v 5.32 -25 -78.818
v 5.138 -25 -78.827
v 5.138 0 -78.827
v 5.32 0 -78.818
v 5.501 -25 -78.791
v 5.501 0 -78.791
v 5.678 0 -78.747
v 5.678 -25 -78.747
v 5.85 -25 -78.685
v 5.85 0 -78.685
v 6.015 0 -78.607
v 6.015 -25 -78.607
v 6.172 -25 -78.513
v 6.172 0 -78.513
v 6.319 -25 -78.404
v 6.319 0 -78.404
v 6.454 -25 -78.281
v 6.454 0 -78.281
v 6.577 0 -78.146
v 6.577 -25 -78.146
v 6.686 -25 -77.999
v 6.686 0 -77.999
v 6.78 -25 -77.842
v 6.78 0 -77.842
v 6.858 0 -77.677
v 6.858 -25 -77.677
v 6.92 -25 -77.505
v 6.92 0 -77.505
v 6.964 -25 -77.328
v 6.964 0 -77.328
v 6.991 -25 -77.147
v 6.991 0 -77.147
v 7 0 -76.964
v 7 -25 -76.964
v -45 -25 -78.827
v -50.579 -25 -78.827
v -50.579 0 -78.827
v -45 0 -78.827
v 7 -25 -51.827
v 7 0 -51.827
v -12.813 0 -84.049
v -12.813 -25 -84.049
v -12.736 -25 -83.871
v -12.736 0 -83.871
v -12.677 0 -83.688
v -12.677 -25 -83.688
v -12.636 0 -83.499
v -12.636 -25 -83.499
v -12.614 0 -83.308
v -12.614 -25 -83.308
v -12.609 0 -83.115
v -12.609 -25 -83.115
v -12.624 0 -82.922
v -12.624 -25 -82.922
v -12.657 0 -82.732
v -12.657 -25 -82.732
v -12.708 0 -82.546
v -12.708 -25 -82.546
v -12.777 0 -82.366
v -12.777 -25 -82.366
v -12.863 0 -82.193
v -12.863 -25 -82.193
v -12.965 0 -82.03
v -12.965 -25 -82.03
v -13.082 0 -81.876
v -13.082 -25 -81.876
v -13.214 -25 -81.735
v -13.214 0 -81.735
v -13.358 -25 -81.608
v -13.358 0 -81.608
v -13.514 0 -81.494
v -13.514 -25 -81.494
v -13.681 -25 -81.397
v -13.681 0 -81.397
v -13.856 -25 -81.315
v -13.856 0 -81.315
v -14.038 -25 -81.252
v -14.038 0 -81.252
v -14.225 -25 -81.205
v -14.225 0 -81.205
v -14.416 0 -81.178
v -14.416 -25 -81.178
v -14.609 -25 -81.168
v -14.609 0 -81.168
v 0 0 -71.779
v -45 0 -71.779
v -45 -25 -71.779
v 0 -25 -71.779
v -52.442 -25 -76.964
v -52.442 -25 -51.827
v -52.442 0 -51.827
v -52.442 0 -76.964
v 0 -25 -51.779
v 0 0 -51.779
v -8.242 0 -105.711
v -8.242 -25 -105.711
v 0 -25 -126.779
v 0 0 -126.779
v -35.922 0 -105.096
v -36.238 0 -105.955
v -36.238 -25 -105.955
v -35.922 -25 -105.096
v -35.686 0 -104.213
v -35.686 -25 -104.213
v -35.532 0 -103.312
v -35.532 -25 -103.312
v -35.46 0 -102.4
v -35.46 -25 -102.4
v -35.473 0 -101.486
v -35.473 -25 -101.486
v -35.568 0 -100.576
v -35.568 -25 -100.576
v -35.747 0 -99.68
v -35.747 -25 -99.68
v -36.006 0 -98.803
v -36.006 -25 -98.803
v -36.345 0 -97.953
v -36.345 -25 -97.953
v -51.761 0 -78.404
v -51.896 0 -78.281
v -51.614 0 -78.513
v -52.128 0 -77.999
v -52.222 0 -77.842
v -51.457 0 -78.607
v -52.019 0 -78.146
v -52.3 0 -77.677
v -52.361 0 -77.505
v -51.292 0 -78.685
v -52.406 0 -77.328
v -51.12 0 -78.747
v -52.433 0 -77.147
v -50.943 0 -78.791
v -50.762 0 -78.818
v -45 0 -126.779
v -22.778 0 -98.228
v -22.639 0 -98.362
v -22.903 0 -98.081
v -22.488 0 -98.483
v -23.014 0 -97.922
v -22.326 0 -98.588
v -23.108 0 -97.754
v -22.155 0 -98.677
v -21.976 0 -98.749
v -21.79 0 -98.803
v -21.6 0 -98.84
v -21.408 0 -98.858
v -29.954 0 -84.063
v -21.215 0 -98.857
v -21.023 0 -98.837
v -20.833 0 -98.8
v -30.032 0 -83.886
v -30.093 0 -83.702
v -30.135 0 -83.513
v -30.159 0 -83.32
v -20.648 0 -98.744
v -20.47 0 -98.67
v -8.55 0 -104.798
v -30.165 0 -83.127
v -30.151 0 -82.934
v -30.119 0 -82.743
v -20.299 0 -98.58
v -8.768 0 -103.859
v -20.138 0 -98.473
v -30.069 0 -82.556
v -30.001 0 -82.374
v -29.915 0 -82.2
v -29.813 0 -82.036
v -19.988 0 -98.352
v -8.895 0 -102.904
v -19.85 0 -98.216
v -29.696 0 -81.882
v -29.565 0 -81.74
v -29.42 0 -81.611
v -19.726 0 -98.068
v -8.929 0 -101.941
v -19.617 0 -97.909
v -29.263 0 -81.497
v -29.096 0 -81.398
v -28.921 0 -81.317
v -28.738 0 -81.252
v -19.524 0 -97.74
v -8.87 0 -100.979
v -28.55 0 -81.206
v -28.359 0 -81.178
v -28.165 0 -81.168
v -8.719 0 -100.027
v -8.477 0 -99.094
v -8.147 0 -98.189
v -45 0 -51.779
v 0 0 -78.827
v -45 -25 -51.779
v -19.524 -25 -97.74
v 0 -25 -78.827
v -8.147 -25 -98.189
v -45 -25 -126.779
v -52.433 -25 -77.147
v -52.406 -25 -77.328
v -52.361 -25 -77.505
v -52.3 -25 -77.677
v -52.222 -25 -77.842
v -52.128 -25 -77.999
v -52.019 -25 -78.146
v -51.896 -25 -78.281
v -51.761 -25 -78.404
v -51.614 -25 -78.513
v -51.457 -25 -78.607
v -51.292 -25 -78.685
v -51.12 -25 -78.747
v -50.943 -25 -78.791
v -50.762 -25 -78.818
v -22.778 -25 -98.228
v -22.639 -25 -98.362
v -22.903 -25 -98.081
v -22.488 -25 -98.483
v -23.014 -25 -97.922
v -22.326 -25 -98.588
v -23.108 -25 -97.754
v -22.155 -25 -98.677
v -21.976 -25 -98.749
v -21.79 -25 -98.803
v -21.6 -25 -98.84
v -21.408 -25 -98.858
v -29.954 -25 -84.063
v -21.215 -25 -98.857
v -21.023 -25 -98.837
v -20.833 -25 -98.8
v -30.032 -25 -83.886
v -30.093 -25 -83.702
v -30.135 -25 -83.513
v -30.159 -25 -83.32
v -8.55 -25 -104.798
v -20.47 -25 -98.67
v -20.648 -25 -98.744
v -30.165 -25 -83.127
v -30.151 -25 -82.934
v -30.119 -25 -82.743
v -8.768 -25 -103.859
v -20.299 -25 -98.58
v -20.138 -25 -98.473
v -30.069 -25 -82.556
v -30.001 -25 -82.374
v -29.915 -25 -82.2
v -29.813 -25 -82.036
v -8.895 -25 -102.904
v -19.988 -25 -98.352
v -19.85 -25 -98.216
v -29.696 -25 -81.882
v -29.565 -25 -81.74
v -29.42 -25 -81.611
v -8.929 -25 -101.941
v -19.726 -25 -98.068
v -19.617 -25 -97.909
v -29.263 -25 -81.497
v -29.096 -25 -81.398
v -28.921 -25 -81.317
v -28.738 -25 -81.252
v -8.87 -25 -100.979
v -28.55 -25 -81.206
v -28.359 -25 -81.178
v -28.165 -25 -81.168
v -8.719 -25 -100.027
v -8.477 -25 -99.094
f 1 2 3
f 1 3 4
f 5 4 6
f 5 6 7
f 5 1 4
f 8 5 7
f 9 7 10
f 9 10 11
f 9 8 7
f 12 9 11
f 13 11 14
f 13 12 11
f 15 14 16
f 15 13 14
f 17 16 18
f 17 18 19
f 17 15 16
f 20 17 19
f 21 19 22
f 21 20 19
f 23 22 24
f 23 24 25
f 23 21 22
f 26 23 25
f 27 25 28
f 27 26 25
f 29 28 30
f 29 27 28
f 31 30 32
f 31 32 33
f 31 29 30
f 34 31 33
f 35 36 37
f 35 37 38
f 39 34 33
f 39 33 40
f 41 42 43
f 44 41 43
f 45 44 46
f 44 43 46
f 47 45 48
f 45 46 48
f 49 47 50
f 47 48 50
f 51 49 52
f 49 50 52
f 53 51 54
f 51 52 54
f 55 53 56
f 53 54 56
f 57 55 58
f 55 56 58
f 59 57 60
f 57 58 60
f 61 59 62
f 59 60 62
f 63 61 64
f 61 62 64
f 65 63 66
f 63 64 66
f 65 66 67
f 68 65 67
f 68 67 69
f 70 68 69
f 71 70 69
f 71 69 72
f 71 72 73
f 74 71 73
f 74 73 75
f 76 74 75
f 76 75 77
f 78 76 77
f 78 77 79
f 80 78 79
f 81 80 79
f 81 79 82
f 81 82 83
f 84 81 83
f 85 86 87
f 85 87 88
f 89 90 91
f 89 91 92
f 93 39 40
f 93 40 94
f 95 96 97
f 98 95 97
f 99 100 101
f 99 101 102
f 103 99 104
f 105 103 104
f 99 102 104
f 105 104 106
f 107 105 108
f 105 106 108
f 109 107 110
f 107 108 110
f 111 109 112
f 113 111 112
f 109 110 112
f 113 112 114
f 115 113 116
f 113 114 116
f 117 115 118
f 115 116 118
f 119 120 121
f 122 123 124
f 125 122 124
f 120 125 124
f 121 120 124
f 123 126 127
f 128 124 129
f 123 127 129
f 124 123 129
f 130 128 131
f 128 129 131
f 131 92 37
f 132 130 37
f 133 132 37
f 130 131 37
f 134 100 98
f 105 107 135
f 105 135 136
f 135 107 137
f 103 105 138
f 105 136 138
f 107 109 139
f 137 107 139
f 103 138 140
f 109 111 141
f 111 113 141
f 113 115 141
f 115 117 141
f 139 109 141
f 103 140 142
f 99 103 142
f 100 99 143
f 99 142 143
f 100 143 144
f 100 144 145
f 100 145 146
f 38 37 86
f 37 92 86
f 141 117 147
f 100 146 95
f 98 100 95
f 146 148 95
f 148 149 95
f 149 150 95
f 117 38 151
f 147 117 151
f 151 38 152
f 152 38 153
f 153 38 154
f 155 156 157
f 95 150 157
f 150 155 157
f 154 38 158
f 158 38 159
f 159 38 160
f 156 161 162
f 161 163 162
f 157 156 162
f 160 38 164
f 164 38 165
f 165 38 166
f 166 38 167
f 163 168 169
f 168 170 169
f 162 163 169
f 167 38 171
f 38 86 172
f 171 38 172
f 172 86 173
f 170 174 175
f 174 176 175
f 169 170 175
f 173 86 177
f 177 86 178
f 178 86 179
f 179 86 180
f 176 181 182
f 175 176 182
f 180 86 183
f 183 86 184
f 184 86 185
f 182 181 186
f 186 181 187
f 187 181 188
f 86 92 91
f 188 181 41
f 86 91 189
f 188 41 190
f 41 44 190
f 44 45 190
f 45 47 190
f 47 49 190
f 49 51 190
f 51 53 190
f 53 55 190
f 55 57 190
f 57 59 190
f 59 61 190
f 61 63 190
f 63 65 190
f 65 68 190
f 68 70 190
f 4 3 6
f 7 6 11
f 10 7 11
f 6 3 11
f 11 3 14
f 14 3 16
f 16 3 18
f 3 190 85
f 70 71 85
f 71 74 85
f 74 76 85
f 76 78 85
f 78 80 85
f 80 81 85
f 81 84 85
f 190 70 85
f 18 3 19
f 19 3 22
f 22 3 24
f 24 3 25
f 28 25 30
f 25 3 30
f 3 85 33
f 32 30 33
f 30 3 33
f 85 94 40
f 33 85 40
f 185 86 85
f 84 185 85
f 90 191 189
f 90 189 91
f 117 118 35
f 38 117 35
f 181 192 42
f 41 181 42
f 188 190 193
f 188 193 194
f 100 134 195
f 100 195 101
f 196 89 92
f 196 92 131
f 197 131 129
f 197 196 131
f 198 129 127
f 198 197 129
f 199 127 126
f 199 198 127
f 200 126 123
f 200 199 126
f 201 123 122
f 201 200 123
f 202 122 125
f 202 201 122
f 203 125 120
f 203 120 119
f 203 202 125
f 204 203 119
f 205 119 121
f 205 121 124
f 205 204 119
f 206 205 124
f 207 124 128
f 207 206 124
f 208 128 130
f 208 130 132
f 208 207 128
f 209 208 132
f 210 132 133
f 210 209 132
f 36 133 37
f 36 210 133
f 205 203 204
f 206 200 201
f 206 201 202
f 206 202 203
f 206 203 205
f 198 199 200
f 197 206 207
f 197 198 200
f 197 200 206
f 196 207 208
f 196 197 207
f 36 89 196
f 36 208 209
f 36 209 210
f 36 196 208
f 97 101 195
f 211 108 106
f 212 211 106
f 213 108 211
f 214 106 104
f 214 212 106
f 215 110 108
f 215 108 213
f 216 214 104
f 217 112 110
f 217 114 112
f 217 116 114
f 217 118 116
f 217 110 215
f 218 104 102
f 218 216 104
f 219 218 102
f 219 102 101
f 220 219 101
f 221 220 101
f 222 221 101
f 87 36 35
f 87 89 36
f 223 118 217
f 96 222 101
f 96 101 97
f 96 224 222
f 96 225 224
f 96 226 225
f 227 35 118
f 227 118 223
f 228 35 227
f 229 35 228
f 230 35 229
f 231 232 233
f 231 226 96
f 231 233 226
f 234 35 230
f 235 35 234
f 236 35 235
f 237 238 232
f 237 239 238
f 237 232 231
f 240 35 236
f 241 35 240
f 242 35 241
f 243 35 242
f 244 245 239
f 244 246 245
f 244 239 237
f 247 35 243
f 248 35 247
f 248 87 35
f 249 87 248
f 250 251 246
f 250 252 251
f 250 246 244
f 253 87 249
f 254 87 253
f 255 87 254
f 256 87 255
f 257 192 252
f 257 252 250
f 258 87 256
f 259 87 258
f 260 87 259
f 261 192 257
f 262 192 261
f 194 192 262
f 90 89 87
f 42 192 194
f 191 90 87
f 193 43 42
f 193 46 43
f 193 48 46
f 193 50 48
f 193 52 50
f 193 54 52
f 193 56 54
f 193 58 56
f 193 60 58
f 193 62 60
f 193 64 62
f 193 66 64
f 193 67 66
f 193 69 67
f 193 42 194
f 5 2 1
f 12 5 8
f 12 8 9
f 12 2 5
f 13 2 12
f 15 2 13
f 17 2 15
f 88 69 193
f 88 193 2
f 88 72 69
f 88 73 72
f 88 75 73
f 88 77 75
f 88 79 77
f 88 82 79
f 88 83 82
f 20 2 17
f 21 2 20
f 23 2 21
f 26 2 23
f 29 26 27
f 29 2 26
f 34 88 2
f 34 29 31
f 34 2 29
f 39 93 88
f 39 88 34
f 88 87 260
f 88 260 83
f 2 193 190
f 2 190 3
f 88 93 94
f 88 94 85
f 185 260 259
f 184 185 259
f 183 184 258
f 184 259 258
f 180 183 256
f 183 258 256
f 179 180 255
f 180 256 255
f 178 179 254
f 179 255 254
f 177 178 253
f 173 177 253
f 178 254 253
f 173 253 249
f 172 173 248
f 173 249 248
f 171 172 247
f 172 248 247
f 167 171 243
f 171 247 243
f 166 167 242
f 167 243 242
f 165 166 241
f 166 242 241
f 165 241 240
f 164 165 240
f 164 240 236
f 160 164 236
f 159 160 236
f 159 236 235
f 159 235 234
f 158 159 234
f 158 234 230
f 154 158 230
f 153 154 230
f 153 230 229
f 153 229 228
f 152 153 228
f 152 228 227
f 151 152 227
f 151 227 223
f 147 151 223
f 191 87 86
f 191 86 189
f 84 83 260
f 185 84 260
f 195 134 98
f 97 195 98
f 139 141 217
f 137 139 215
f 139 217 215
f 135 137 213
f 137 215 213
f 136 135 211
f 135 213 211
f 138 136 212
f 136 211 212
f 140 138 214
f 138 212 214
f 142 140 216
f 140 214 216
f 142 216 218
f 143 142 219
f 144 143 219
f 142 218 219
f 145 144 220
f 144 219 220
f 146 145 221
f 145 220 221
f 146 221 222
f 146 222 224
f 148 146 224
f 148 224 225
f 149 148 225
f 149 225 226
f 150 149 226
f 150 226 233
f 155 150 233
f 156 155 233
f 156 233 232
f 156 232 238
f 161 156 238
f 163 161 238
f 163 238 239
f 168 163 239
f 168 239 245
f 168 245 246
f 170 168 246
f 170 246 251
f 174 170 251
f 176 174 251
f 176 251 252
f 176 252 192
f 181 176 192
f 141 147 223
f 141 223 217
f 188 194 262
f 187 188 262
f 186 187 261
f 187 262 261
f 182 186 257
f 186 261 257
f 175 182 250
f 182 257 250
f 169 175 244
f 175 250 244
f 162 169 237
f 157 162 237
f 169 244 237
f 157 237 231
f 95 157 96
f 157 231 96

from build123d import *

# Parameters (mm, degrees)
F0_W     = 45
F0_H     = 55
F1_DEPTH = 25
F3_DEPTH = 25
F5_DEPTH = 25
F7_DEPTH = 42.3


with BuildPart() as f1:
    # F0 (on Front) → F1 (new body)
    with BuildSketch(Plane.XZ):
        with Locations((-22.5, -99.278839)):
            Rectangle(F0_W, F0_H)
    extrude(amount=F1_DEPTH)

    # F2 (on face) → F3 (join)
    with BuildSketch(Plane.XZ.offset(25)):
        with BuildLine():
            Line((0, -51.778839), (0, -71.778839))
            Line((0, -71.778839), (0, -78.826934))
            Line((0, -78.826934), (5.137502, -78.826934))
            ThreePointArc((5.137502, -78.826934), (6.454487, -78.281421), (7, -76.964436))
            Line((7, -76.964436), (7, -51.826934))
            Line((7, -51.826934), (0, -51.778839))
        make_face()
        with BuildLine():
            Line((-45, -78.826934), (-45, -71.778839))
            Line((-45, -71.778839), (-45, -51.778839))
            Line((-45, -51.778839), (-52.44166, -51.826934))
            Line((-52.44166, -51.826934), (-52.44166, -76.964436))
            ThreePointArc((-52.44166, -76.964436), (-51.896147, -78.281421), (-50.579162, -78.826934))
            Line((-50.579162, -78.826934), (-45, -78.826934))
        make_face()
    extrude(amount=-F3_DEPTH)

    # F4 (on face) → F5 (cut)
    with BuildSketch(Plane.XZ.offset(25)):
        with BuildLine():
            Line((-8.242352, -105.71086), (0, -126.778839))
            Line((0, -126.778839), (0, -78.826934))
            Line((0, -78.826934), (-8.146975, -98.189167))
            ThreePointArc((-8.146975, -98.189167), (-8.928874, -101.940703), (-8.242352, -105.71086))
        make_face()
        with BuildLine():
            Line((-36.344591, -97.953365), (-45, -78.826934))
            Line((-45, -78.826934), (-45, -126.778839))
            Line((-45, -126.778839), (-36.23784, -105.954549))
            ThreePointArc((-36.23784, -105.954549), (-35.456027, -101.942814), (-36.344591, -97.953365))
        make_face()
    extrude(amount=-F5_DEPTH, mode=Mode.SUBTRACT)

    # F6 (on face) → F7 (cut)
    with BuildSketch(Plane.XZ.offset(25)):
        with BuildLine():
            ThreePointArc((-12.812875, -84.048576), (-12.911621, -82.110146), (-14.60875, -81.168331))
            Line((-14.60875, -81.168331), (-21.401127, -81.168331))
            Line((-21.401127, -81.168331), (-28.165059, -81.168331))
            ThreePointArc((-28.165059, -81.168331), (-29.866361, -82.116868), (-29.953914, -84.062758))
            Line((-29.953914, -84.062758), (-23.108318, -97.753949))
            ThreePointArc((-23.108318, -97.753949), (-21.311551, -98.859506), (-19.523588, -97.739767))
            Line((-19.523588, -97.739767), (-12.812875, -84.048576))
        make_face()
    extrude(amount=-F7_DEPTH, mode=Mode.SUBTRACT)


solid = f1.part
